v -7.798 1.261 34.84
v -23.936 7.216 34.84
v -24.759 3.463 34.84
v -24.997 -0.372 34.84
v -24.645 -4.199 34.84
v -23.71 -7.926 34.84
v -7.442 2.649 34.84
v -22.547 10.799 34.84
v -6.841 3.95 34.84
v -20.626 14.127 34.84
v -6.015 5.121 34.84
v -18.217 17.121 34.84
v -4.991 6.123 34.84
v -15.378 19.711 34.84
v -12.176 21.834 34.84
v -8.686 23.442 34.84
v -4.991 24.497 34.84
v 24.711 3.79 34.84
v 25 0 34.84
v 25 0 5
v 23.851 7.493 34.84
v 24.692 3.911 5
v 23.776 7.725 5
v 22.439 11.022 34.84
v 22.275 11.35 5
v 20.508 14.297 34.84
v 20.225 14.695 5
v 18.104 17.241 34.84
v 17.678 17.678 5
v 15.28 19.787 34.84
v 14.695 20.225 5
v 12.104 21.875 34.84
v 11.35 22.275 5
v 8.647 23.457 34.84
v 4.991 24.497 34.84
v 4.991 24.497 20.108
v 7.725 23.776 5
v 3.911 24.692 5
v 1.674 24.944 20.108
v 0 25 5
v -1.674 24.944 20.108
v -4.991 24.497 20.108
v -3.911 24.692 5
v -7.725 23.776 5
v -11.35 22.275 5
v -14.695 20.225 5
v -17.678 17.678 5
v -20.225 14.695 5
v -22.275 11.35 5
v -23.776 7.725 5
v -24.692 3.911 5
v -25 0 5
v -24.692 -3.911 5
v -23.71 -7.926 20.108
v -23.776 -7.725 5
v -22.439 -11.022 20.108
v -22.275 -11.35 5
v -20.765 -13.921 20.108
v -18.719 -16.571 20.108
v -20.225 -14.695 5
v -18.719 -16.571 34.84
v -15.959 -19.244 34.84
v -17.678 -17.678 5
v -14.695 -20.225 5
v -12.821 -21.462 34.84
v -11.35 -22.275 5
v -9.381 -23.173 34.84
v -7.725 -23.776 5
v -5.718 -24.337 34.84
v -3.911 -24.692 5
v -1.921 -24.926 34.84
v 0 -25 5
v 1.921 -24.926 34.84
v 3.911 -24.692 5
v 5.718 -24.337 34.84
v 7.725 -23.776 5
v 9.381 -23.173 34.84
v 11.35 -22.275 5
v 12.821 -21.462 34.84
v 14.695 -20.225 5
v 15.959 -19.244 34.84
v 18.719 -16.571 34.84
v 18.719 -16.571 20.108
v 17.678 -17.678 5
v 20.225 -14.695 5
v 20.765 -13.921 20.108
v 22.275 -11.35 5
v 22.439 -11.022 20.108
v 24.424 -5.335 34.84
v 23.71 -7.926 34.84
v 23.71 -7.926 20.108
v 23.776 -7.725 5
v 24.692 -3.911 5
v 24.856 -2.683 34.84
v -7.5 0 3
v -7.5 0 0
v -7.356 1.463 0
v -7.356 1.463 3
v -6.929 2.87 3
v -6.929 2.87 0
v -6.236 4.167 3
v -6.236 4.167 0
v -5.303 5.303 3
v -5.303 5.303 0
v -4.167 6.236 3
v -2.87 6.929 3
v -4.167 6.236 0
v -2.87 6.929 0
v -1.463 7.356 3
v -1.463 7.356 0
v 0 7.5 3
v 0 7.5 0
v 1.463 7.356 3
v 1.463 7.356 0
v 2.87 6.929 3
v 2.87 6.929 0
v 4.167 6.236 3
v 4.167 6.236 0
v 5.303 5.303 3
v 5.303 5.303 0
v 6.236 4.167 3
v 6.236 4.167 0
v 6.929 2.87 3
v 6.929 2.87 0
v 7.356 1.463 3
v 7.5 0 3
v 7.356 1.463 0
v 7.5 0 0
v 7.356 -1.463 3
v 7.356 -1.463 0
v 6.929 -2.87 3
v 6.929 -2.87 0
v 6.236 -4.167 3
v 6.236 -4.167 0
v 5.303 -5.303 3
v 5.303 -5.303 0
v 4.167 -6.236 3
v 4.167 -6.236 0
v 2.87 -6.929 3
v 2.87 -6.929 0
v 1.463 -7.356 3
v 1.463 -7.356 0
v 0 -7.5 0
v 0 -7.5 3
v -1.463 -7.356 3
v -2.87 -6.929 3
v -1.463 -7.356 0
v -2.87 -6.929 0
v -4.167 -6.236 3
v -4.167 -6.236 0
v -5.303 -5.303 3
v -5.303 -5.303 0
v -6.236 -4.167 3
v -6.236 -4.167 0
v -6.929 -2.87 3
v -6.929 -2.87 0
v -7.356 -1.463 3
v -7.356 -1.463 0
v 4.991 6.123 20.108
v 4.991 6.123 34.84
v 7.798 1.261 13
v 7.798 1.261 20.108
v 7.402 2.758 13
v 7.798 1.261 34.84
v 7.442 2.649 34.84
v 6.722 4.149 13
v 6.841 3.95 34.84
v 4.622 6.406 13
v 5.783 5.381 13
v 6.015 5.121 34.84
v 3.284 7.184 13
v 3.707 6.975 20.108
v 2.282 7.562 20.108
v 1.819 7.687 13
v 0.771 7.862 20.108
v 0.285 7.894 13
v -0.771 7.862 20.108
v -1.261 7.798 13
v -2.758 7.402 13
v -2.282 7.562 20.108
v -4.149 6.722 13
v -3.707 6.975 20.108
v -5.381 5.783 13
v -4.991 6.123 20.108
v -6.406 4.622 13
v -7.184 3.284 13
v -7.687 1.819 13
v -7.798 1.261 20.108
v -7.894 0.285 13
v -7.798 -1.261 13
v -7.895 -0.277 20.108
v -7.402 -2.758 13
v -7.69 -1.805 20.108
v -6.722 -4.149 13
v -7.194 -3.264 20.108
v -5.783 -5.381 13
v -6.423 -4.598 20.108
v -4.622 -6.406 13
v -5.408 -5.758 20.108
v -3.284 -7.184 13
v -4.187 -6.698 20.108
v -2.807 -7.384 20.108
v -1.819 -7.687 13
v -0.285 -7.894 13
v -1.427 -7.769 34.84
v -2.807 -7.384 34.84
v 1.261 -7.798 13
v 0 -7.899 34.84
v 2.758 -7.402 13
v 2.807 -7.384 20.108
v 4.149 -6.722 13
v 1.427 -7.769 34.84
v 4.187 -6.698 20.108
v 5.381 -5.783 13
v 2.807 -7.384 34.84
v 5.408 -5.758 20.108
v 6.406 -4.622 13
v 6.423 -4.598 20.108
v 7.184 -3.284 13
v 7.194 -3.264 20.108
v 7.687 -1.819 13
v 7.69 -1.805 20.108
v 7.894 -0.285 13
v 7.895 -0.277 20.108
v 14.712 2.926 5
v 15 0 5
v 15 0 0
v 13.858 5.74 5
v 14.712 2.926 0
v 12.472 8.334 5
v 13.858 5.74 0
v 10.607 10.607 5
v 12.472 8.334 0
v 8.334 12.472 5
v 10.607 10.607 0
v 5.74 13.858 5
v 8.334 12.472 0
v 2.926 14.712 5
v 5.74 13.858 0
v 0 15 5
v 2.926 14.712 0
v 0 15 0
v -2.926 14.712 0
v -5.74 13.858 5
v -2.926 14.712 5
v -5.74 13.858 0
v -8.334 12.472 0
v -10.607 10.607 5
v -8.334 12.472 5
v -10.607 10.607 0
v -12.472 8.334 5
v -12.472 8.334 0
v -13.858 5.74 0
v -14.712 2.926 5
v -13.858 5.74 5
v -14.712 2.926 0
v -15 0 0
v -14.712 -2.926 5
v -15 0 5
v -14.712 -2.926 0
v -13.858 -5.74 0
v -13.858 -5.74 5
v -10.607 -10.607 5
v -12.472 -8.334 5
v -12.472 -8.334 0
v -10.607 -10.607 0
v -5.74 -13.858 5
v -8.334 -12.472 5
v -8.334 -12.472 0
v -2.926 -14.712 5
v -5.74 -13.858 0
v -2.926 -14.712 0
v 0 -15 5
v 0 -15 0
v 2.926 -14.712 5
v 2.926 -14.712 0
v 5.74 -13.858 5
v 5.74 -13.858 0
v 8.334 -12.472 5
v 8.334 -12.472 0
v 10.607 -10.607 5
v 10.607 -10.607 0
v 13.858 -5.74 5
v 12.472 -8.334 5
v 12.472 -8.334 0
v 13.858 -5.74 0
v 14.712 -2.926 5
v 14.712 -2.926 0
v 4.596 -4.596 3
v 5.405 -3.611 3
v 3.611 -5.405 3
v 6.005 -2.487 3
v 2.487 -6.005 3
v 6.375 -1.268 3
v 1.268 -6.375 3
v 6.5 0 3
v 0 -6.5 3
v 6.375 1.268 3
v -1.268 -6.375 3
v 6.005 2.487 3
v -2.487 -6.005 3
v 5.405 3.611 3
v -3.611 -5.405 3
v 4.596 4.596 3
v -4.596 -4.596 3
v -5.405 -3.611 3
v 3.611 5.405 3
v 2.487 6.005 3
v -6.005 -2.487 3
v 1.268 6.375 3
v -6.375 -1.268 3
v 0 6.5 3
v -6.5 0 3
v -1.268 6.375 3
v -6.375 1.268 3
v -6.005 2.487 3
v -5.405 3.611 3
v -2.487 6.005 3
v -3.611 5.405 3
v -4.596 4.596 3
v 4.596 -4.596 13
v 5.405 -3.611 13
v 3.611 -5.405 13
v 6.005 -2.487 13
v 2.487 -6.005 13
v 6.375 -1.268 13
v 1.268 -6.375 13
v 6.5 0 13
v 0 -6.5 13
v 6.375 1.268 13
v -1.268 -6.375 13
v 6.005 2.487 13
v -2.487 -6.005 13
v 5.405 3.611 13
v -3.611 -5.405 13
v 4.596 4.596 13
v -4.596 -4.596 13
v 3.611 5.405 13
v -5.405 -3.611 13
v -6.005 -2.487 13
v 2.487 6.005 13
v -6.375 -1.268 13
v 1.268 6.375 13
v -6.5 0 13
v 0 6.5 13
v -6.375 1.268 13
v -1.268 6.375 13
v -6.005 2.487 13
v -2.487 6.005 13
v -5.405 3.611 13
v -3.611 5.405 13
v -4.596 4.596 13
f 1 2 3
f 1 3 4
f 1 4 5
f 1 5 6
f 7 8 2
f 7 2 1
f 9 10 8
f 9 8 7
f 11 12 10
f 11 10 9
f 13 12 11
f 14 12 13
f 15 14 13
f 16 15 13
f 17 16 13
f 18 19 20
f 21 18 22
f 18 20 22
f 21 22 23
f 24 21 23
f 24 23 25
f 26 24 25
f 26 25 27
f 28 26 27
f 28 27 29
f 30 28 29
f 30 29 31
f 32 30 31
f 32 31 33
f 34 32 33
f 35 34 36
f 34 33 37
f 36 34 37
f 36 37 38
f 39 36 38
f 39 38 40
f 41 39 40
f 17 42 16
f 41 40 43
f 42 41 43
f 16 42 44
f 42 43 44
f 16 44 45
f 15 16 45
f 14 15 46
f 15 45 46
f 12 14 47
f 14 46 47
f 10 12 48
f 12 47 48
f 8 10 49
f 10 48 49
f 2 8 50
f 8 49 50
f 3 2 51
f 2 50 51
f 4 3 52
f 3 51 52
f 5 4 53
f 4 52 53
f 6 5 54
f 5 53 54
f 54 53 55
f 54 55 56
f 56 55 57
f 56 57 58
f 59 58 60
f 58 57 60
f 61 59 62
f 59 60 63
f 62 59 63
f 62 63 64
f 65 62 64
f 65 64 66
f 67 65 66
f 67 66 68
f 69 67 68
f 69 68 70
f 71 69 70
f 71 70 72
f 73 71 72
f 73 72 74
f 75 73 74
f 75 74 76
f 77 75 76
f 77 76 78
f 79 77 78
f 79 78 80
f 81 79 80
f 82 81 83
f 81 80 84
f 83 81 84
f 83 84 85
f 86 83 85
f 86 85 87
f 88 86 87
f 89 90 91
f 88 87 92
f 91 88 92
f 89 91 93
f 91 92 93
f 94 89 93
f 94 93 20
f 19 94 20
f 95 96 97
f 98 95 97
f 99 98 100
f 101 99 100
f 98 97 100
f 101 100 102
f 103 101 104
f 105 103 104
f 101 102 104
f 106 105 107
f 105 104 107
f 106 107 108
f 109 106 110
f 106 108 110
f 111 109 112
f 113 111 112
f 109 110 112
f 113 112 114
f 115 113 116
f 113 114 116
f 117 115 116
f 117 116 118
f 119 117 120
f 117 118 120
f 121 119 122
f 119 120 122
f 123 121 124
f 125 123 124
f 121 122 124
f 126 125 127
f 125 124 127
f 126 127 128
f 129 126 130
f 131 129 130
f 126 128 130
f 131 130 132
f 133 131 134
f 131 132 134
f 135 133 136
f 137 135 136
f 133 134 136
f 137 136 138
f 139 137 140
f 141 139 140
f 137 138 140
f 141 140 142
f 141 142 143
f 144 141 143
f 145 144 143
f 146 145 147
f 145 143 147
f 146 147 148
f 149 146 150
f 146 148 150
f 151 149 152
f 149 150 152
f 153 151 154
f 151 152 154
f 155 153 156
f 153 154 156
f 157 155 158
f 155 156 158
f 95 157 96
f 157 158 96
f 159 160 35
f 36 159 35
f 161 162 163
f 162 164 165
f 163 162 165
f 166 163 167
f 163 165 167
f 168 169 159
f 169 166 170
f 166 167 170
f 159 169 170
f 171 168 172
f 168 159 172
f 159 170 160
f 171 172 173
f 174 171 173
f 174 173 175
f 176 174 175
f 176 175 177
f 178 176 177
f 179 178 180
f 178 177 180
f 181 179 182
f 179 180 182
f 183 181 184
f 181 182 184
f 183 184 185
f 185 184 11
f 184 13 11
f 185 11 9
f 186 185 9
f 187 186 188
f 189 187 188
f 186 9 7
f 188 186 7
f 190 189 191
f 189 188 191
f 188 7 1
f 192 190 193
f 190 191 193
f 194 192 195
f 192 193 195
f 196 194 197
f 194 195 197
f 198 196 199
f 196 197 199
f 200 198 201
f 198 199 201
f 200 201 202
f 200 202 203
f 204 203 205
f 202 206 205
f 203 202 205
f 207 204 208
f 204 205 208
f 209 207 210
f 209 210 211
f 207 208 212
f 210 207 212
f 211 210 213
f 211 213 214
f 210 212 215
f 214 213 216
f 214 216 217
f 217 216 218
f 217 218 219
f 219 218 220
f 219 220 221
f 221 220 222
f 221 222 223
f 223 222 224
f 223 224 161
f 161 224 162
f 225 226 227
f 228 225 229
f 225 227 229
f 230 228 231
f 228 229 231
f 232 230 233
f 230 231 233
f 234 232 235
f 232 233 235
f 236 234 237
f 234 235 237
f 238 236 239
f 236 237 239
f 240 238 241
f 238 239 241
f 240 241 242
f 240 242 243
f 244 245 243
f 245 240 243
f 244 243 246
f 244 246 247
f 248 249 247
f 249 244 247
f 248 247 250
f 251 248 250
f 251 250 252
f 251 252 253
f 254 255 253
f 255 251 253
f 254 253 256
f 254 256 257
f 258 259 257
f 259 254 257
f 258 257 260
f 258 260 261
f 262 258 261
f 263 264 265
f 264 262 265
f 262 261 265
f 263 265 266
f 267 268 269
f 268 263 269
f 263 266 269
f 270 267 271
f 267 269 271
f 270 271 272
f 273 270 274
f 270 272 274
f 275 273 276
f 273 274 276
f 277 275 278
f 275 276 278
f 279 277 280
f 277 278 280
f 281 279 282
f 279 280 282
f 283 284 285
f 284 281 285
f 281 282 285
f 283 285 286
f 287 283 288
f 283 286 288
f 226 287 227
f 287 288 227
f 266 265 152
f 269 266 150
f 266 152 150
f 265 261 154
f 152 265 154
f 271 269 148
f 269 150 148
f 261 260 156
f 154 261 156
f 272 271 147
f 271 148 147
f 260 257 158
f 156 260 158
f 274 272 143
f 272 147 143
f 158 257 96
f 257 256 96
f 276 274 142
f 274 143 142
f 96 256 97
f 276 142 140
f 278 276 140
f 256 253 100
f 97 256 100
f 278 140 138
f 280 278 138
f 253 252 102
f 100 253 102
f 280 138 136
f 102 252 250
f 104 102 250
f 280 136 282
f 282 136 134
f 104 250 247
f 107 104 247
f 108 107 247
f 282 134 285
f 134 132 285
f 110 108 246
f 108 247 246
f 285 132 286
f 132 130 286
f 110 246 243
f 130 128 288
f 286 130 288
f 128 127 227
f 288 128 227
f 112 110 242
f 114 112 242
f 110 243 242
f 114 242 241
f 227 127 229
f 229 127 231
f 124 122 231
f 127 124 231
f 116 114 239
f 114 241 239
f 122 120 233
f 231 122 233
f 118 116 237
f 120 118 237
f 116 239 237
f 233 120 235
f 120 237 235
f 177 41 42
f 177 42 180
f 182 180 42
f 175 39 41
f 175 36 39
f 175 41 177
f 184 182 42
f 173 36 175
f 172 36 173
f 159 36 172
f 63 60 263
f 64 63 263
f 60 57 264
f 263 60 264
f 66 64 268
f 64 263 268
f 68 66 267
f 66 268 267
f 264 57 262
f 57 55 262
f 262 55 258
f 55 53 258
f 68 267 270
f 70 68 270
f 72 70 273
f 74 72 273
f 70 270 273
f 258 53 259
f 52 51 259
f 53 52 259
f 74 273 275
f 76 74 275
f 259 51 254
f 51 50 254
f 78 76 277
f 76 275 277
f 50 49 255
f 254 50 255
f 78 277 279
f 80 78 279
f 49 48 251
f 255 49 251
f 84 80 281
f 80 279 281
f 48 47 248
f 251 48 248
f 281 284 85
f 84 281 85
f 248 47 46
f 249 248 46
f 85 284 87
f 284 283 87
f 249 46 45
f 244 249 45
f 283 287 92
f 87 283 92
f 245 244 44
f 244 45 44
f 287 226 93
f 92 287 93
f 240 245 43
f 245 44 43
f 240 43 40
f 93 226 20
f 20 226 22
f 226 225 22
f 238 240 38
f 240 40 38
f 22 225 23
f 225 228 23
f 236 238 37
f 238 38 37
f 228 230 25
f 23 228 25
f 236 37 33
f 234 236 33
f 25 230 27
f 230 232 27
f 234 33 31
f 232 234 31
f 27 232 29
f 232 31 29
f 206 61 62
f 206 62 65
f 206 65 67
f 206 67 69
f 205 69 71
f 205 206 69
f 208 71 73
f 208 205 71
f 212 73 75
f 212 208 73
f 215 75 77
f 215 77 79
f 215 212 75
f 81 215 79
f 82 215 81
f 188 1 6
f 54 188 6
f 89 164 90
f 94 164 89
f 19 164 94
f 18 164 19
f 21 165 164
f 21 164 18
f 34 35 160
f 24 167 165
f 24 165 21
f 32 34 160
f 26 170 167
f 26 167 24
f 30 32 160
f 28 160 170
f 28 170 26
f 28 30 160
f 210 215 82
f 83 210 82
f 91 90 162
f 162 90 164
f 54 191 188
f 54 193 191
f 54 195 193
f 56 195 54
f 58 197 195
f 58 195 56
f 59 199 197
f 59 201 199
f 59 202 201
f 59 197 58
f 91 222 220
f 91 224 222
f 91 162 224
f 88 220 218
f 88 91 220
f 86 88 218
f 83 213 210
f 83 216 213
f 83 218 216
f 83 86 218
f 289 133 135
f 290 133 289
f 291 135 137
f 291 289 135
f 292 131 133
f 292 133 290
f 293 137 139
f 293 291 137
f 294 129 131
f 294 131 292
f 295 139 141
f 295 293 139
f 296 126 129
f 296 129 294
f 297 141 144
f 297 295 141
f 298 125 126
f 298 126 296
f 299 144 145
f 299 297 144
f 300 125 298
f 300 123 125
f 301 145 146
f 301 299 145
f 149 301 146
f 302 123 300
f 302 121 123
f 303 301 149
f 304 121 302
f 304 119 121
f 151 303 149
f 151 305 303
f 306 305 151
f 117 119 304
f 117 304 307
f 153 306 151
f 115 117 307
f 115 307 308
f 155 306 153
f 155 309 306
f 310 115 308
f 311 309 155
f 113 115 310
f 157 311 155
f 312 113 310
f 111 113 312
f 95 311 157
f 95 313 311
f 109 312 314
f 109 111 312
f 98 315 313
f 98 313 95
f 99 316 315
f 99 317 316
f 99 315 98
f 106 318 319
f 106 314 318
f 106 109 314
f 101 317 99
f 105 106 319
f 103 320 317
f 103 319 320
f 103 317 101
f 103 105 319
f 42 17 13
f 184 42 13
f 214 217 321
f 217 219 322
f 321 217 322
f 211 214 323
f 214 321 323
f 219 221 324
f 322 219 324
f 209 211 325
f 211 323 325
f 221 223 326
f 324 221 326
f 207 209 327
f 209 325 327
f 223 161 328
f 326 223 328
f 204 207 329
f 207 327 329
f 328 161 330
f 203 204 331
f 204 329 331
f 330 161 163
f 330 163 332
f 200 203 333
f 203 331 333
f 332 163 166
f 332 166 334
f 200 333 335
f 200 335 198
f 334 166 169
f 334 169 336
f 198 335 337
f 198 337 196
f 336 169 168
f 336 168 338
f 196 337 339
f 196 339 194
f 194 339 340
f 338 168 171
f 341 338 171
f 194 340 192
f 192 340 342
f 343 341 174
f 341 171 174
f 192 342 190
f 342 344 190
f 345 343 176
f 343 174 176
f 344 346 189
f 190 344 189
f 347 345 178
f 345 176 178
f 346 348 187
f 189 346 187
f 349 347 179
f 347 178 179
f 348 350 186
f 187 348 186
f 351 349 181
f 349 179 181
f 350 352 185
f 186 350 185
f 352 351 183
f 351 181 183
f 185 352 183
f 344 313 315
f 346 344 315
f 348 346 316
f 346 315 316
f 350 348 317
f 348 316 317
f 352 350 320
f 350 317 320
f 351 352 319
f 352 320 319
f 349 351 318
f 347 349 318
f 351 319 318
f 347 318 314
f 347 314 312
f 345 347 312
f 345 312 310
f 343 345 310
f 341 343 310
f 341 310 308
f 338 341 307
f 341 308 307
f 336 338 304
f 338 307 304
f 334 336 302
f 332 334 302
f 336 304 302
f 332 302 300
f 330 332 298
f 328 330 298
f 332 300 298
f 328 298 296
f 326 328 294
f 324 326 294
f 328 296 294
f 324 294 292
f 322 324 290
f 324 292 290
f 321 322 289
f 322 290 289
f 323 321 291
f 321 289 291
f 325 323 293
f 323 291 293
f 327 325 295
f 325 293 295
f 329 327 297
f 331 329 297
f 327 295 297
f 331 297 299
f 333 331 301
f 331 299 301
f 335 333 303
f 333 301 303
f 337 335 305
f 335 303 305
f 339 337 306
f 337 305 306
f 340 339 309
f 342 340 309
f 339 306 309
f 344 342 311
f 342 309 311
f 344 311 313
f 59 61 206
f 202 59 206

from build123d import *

# Parameters (mm, degrees)
SKETCH1_R          = 15
EXTRUDE1_DEPTH     = 33
SKETCH2_R          = 7.5
CUT_EXTRUDE1_DEPTH = 3
SKETCH3_R          = 25
EXTRUDE2_DEPTH     = 29.84000001
CUT_EXTRUDE2_DEPTH = 14.732
CIRPATTERN1_COUNT  = 3
SKETCH6_R          = 6.5
CUT_EXTRUDE4_DEPTH = 10
CUT_EXTRUDE3_REACH = 51.637
SKETCH5_R          = 7.8994


with BuildPart() as part:
    # Sketch1 → Extrude1 (new body)
    with BuildSketch(Plane.XY):
        Circle(SKETCH1_R)
    extrude(amount=EXTRUDE1_DEPTH)

    # Sketch2 → Cut-Extrude1 (cut)
    with BuildSketch(Plane(origin=(0, 0, 0), x_dir=(-1, 0, 0), z_dir=(0, 0, -1))):
        Circle(SKETCH2_R)
    extrude(amount=-CUT_EXTRUDE1_DEPTH, mode=Mode.SUBTRACT)

    # Sketch3 → Extrude2 (add)
    with BuildSketch(Plane.XY.offset(4.999999906)):
        Circle(SKETCH3_R)
    extrude(amount=EXTRUDE2_DEPTH)

    # Sketch4 → Cut-Extrude2 (cut)
    with BuildSketch(Plane.XY.offset(34.839999916)):
        Polygon((0, 0), (4.9911, 0), (4.9911, 26.885801132), (-4.9911, 26.885801132), (-4.9911, 0), align=None)
    cut_extrude2 = extrude(amount=-CUT_EXTRUDE2_DEPTH, mode=Mode.SUBTRACT)

    # CirPattern1: Cut-Extrude2 ×3 about axis
    cirpattern1_axis = Axis((0, 0, 0), (0, 0, 1))
    for i in range(1, CIRPATTERN1_COUNT):
        add(cut_extrude2.rotate(cirpattern1_axis, i * 360 / CIRPATTERN1_COUNT), mode=Mode.SUBTRACT)

    # Sketch6 → Cut-Extrude4 (cut)
    with BuildSketch(Plane(origin=(0, 0, 3), x_dir=(-1, 0, 0), z_dir=(0, 0, -1))):
        Circle(SKETCH6_R)
    extrude(amount=-CUT_EXTRUDE4_DEPTH, mode=Mode.SUBTRACT)

    # Cut-Extrude3: up to this face of the body (flat: up to its plane)
    cut_extrude3_end = Plane(part.part.faces().sort_by_distance((0, 0, 13))[0])
    # Sketch5 → Cut-Extrude3 (cut, up to the picked face)
    with BuildSketch(Plane.XY.offset(34.839999916), mode=Mode.PRIVATE) as cut_extrude3_sk1:
        with Locations(Location((0, 0, 0), (0, 0, 9.185472822))):
            Circle(SKETCH5_R)
    cut_extrude3_tool1 = split(extrude(cut_extrude3_sk1.sketch, amount=-CUT_EXTRUDE3_REACH, mode=Mode.PRIVATE), bisect_by=cut_extrude3_end, keep=Keep.BOTH, mode=Mode.PRIVATE)
    add(cut_extrude3_tool1.solids().sort_by(Axis((0, 0, 34.84), (0, 0, -1)))[0], mode=Mode.SUBTRACT)


solid = part.part
